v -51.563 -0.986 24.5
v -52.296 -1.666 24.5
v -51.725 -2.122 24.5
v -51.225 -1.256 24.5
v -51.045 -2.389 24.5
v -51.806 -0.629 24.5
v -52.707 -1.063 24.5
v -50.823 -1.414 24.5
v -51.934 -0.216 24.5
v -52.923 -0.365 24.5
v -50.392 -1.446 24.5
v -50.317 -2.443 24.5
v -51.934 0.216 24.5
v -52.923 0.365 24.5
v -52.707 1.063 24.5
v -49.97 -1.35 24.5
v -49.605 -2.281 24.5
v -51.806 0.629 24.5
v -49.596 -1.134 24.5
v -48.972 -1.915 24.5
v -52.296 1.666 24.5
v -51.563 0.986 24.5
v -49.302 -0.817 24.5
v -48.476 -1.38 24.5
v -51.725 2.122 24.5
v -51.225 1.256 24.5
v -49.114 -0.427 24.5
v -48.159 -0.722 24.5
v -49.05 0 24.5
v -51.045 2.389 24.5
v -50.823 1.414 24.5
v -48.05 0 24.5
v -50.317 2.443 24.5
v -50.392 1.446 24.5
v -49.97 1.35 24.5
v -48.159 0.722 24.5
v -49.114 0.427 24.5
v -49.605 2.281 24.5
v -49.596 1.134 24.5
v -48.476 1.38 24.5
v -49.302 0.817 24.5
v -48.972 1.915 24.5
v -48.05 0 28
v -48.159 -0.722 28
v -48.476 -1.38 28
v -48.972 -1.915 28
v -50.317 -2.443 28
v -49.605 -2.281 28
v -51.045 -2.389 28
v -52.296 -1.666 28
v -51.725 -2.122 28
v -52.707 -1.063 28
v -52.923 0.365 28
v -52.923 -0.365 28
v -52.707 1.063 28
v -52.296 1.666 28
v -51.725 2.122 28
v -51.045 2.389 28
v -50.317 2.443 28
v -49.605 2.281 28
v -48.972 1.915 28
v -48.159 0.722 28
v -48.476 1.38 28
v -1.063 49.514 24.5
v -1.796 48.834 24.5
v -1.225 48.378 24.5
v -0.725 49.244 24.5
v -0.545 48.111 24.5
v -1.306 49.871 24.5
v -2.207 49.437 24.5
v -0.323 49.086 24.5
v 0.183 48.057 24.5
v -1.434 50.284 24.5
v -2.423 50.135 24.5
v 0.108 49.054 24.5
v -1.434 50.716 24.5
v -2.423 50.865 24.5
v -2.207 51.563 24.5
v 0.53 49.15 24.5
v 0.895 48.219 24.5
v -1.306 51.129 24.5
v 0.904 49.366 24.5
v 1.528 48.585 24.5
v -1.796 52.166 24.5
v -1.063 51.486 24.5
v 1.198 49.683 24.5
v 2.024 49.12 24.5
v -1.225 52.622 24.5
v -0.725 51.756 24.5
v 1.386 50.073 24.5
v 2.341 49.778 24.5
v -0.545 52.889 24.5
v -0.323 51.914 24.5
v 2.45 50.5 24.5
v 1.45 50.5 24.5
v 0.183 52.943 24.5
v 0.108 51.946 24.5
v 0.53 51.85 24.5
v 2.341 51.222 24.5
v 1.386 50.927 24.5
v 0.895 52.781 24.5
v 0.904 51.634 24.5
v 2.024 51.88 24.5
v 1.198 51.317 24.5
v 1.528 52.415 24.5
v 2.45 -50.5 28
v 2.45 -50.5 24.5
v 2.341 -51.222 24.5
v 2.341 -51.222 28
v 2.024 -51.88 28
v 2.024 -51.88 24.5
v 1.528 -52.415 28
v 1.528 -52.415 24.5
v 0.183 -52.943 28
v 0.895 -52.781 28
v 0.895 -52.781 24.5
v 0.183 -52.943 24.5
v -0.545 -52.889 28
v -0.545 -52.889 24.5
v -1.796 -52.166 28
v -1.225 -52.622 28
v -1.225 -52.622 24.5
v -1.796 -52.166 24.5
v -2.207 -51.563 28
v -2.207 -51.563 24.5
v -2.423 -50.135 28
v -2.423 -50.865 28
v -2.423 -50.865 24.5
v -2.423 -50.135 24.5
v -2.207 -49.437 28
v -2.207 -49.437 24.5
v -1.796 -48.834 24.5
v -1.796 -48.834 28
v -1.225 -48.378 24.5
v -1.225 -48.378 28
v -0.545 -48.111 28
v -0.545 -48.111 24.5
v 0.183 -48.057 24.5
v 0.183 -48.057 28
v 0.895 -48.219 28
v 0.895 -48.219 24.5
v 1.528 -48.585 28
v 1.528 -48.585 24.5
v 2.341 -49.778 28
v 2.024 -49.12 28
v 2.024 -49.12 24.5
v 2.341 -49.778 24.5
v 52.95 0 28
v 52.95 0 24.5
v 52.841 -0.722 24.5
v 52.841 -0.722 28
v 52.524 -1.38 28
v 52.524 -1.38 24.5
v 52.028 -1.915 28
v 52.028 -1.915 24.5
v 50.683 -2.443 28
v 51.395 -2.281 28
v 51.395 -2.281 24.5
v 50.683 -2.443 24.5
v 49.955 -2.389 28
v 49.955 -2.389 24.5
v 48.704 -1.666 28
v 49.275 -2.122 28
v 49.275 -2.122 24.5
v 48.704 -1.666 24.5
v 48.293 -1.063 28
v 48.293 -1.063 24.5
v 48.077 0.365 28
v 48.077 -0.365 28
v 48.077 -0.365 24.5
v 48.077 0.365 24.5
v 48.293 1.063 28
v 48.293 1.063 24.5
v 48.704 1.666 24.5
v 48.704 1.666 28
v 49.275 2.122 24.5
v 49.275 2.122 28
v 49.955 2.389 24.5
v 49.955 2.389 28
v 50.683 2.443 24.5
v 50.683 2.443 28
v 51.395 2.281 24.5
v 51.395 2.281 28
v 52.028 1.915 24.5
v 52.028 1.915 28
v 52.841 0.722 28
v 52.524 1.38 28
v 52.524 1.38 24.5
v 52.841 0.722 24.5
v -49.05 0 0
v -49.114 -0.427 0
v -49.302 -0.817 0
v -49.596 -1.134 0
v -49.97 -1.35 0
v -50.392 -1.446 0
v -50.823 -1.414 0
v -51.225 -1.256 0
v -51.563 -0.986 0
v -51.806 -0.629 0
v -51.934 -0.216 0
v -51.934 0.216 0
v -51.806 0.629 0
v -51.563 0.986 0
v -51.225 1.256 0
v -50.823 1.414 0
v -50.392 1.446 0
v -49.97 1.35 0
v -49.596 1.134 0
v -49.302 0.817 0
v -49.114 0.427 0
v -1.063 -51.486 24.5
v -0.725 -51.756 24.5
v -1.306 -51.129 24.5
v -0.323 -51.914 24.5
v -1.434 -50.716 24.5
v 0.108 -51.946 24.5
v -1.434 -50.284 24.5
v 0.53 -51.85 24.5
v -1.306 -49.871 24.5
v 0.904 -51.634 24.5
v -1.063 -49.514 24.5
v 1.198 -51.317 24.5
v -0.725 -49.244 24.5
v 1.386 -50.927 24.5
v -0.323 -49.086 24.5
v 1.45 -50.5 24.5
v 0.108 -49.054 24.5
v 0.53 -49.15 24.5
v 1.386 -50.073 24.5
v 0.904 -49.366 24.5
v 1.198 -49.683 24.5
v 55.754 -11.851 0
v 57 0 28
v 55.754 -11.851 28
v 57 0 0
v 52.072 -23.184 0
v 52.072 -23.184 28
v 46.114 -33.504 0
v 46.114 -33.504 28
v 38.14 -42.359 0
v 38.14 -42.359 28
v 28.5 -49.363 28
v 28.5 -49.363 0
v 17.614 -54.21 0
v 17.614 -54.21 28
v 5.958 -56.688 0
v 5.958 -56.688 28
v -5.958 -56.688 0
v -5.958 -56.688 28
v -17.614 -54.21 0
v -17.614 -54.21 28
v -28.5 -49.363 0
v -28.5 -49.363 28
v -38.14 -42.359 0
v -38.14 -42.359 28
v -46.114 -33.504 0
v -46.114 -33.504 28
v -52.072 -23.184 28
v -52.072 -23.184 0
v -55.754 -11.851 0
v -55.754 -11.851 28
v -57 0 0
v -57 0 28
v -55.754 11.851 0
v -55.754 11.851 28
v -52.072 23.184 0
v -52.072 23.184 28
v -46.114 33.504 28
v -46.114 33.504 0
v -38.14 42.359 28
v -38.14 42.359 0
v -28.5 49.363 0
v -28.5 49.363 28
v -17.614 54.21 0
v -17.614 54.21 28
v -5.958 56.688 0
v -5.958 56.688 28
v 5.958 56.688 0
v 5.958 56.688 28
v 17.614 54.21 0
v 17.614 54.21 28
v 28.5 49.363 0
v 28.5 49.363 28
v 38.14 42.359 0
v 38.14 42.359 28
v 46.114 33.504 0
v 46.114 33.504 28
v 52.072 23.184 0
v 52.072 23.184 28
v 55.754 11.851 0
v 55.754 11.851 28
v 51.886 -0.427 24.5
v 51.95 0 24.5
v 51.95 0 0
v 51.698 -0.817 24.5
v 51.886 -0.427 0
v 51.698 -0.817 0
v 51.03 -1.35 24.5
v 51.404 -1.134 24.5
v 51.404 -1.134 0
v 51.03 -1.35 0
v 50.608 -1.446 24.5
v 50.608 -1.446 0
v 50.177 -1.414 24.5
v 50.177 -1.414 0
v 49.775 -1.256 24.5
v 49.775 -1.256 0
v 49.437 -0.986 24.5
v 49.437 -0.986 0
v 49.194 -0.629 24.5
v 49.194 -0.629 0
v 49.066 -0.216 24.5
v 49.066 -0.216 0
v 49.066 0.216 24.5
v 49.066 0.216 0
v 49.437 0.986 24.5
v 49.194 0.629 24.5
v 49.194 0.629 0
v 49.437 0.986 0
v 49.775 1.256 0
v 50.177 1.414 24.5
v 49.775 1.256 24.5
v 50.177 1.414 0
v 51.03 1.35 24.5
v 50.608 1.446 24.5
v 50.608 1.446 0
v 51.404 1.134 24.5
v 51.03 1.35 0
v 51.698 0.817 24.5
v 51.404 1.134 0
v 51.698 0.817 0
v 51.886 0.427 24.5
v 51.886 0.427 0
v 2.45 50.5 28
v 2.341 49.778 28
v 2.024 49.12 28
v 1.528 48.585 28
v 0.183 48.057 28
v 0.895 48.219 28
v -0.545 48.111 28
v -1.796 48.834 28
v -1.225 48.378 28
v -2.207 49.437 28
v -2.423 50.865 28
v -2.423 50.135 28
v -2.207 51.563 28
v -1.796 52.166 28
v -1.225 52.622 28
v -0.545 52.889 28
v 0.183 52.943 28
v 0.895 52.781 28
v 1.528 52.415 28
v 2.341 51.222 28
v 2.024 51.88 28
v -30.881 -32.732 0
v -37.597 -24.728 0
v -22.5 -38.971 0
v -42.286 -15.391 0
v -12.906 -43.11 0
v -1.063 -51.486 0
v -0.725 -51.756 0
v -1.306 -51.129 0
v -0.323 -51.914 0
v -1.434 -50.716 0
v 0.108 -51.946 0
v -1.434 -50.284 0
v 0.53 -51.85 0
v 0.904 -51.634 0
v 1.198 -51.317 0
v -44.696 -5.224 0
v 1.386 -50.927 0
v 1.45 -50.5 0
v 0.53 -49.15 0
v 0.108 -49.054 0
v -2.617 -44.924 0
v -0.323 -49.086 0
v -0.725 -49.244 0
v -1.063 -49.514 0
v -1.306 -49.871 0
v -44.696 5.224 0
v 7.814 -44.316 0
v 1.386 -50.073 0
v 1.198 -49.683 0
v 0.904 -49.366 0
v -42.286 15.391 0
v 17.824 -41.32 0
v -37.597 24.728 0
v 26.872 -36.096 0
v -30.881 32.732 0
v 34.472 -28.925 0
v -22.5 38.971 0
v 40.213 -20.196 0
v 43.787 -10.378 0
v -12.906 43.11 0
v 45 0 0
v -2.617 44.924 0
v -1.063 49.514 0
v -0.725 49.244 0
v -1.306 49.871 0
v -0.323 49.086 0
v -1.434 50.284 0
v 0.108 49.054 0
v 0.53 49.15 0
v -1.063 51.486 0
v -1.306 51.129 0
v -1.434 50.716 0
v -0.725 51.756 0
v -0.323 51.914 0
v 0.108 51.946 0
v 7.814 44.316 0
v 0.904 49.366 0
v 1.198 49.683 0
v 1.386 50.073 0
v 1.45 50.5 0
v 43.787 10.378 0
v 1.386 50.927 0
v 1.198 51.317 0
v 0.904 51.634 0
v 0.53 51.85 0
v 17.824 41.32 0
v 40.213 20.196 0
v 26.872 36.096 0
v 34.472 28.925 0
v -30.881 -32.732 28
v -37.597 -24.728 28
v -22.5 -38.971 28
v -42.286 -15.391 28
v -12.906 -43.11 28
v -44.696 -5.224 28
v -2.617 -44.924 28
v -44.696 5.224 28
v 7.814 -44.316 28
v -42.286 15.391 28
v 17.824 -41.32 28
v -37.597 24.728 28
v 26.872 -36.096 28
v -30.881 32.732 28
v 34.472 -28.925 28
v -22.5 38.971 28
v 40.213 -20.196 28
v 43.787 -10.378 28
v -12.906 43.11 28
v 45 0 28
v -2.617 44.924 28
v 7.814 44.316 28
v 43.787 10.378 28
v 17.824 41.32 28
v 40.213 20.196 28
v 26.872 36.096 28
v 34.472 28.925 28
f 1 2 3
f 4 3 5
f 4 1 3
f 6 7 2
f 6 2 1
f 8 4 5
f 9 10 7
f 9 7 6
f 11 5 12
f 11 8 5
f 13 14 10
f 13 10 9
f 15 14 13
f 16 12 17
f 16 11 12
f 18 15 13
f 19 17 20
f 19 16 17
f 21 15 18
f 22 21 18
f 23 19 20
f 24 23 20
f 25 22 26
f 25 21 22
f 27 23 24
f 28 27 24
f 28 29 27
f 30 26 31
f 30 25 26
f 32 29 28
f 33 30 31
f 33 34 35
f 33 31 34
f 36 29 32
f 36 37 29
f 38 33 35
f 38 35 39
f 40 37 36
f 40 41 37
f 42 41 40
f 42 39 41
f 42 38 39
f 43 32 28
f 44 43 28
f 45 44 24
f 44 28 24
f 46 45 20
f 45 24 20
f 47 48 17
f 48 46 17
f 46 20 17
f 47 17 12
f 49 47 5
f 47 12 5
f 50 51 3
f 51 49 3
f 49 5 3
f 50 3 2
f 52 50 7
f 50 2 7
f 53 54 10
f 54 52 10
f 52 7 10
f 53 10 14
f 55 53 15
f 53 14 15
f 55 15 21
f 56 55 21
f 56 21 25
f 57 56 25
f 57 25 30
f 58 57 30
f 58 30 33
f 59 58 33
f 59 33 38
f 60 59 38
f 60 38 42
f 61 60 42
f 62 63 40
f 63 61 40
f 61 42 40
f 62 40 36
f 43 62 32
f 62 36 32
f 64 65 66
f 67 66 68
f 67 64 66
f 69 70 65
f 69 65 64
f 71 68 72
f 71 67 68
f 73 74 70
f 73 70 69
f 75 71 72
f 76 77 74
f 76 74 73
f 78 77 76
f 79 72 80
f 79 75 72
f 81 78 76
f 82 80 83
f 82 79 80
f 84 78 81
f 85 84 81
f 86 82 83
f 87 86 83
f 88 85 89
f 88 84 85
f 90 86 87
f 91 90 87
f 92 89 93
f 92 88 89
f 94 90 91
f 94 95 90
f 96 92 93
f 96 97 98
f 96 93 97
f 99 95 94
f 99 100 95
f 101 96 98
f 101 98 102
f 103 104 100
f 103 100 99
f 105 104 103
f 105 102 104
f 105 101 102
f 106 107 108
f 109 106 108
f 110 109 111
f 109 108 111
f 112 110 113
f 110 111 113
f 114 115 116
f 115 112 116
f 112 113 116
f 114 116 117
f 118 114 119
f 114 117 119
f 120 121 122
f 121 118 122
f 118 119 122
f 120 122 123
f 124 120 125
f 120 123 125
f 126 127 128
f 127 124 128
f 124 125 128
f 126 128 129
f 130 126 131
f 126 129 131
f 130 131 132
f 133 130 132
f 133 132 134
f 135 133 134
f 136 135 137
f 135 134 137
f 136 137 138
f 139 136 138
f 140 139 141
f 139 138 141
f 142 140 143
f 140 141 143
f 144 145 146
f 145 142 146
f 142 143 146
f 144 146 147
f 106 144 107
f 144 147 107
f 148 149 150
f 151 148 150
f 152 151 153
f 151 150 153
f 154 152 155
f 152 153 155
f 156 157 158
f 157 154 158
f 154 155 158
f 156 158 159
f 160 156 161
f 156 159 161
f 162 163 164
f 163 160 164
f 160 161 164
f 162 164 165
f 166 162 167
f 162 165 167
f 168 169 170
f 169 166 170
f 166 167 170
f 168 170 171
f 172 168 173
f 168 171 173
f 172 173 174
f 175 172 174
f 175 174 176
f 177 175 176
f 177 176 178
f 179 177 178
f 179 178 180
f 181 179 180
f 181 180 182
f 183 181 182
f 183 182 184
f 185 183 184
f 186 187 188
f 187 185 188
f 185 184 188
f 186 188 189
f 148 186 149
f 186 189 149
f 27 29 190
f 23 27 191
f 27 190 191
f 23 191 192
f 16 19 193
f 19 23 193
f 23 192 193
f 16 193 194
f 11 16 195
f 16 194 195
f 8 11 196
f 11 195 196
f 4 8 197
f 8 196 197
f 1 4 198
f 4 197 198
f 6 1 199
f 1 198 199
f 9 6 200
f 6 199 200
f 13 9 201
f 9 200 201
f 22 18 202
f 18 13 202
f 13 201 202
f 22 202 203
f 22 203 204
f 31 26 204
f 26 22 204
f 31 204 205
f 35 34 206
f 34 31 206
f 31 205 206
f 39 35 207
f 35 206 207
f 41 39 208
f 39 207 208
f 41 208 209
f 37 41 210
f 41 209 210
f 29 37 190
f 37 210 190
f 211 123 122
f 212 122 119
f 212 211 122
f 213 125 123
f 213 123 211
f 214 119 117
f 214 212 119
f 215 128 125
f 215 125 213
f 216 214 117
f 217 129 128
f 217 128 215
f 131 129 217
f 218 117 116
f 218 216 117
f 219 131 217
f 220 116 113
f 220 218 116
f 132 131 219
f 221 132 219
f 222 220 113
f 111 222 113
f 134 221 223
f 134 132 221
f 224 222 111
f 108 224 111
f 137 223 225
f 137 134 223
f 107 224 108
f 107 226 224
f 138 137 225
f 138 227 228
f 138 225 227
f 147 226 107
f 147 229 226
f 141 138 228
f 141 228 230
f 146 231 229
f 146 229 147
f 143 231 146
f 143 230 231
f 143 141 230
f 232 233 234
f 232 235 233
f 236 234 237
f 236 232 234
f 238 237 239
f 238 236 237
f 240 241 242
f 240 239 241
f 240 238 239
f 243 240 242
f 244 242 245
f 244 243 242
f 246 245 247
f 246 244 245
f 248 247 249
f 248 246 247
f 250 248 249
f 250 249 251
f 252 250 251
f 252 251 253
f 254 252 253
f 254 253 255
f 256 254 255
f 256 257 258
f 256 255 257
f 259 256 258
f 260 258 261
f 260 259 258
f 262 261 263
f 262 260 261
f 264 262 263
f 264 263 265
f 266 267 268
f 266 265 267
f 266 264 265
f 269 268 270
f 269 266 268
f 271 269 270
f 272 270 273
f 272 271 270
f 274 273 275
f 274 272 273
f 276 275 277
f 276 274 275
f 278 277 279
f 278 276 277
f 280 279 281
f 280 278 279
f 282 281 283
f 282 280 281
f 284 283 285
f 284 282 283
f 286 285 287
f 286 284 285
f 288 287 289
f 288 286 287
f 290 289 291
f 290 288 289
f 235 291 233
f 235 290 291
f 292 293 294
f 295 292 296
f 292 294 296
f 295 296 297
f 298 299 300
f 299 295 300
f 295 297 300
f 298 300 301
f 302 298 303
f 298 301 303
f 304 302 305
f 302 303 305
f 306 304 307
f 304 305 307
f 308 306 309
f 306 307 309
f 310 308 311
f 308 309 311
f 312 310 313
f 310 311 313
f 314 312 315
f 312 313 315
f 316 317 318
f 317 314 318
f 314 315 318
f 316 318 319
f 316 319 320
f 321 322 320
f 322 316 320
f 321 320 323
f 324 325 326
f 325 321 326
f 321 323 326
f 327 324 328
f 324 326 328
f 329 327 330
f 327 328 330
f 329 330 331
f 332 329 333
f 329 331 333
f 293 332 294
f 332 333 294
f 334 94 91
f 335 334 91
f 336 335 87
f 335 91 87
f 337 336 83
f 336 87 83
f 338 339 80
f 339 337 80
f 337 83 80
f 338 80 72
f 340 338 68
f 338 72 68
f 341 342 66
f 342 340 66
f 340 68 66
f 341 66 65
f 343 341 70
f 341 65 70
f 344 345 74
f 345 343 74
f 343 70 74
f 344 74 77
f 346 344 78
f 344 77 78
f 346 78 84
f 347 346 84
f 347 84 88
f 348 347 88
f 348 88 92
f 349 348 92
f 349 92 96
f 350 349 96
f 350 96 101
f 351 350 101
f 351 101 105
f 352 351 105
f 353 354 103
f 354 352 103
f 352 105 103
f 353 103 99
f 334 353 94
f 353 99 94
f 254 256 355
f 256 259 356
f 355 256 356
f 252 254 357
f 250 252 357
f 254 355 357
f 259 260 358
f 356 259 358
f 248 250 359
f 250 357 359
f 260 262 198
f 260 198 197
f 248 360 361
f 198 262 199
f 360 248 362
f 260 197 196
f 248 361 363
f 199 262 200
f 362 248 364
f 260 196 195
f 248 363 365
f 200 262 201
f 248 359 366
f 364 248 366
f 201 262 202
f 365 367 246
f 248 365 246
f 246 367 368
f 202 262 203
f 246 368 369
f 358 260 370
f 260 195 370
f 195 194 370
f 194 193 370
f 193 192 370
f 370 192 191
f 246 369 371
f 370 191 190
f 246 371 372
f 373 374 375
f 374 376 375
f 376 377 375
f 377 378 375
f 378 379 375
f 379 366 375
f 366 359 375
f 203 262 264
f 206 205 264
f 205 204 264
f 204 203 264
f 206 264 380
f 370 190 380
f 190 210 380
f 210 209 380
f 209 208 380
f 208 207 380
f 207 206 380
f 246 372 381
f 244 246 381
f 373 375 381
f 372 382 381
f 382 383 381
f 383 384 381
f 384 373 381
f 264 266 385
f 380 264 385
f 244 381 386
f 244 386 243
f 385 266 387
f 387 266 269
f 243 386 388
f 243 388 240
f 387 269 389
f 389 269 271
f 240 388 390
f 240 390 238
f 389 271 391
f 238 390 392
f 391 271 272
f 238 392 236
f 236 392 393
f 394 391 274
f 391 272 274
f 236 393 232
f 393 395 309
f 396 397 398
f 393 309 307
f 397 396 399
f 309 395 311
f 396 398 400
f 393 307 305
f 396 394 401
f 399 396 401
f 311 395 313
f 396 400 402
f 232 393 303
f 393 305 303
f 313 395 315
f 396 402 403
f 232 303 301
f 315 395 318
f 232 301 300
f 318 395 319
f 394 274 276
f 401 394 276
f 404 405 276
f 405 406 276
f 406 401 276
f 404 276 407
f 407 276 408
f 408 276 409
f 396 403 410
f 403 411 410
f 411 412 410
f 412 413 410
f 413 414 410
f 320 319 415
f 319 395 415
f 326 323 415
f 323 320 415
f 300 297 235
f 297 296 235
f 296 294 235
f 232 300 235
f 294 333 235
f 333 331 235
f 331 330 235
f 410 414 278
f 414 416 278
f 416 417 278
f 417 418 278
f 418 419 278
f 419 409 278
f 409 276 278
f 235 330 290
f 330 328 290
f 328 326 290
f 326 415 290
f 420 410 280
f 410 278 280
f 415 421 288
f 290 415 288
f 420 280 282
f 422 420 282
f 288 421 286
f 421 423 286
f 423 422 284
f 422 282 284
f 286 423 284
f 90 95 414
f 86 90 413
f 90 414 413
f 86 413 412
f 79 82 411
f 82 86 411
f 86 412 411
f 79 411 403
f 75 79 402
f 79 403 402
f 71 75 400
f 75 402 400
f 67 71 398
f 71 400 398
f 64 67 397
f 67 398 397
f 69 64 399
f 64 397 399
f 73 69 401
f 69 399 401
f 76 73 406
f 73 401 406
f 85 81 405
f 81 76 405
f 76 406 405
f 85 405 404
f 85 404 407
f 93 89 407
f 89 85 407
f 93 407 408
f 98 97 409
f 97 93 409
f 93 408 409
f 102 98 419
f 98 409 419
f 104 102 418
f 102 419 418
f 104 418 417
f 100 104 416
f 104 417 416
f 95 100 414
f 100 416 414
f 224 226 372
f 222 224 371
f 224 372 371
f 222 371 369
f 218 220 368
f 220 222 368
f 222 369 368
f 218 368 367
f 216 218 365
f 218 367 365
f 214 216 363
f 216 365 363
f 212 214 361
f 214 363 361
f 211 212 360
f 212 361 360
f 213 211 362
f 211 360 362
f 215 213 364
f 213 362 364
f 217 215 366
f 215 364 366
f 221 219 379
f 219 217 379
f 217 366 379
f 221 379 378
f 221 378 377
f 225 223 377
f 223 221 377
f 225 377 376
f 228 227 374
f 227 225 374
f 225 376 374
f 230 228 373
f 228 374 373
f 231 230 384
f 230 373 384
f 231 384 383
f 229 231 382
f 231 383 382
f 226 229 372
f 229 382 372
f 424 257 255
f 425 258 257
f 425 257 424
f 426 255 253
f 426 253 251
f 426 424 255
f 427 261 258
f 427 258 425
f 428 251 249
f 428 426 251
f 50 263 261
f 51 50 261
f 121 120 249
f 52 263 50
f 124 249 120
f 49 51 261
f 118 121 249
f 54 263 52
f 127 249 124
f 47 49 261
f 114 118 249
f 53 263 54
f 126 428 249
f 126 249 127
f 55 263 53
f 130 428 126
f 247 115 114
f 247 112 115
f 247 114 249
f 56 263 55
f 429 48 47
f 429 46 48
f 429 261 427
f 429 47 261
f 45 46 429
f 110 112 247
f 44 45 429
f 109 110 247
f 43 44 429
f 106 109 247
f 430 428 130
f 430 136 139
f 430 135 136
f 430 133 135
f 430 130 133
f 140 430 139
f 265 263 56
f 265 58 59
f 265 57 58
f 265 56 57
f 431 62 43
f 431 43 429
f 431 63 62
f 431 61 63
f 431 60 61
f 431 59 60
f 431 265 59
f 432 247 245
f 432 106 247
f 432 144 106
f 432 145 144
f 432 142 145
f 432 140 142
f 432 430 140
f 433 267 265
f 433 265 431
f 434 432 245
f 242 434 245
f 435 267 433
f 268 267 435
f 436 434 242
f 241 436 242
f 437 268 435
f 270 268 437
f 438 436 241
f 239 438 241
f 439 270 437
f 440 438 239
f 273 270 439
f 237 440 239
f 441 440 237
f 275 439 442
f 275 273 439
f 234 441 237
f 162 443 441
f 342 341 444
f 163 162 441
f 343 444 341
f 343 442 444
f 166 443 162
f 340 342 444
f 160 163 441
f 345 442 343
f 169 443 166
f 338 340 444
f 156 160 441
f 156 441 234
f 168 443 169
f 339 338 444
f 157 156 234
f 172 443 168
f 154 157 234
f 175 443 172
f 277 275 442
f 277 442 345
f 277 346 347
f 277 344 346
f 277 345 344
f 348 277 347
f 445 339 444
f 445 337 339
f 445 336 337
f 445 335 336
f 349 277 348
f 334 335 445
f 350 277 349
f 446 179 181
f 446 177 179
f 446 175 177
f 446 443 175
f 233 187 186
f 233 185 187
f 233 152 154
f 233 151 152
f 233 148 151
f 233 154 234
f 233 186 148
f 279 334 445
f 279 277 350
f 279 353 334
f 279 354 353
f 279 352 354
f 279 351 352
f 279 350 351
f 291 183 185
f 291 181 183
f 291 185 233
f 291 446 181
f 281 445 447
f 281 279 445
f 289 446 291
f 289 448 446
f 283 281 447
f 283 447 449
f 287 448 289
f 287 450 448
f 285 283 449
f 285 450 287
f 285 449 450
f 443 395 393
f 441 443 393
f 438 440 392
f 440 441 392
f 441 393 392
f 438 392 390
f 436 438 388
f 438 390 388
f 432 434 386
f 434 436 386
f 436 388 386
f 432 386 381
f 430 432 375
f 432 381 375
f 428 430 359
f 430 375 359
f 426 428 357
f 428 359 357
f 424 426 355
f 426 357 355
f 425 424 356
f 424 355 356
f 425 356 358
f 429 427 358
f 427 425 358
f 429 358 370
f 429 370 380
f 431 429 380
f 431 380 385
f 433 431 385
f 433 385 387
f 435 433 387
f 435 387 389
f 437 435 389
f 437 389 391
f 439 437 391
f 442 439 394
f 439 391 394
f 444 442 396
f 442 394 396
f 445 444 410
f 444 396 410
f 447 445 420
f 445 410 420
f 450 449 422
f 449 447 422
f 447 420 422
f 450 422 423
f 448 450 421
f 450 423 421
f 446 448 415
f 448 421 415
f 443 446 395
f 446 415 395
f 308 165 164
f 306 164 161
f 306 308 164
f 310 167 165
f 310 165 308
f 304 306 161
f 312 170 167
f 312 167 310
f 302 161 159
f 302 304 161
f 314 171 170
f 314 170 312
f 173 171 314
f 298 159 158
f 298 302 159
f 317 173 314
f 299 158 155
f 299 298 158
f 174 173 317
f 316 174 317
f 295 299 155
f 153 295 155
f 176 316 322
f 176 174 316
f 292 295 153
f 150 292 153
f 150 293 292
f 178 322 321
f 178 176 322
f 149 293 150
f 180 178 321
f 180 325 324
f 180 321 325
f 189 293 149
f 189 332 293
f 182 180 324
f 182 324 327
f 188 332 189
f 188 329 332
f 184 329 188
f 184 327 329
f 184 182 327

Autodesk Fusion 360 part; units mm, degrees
sketch "Skizze1" plane through (0, 0, 0) normal (0, 0, 1) x (1, 0, 0)
  circle A0 centre (0, 0) radius 45
  circle A1 centre (0, 0) radius 57
  line L0 (-93.8803, 0) -> (101.1197, 0) construction
  line L1 (0, 80) -> (0, -75) construction
  circle A2 centre (50.5, 0) radius 1.45
  circle A3 centre (0, 50.5) radius 1.45
  line L2 (-57, 57) -> (57, 57) construction
  line L3 (57, 57) -> (57, -57) construction
  line L4 (57, -57) -> (-57, -57) construction
  line L5 (-57, -57) -> (-57, 57) construction
  circle A4 centre (50.5, 0) radius 2.45
  circle A5 centre (0, 50.5) radius 2.45
  circle A6 centre (-50.5, 0) radius 2.45
  circle A7 centre (-50.5, 0) radius 1.45
  circle A8 centre (0, -50.5) radius 2.45
  circle A9 centre (0, -50.5) radius 1.45
  dimension "d1" = 90
  dimension "d2" = 114
  dimension "d3" = 2.9
  dimension "d4" = 2.9
  dimension "d5" = 6.5
  dimension "d6" = 6.5
  dimension "d7" = 4.9
  dimension "d8" = 4.9
extrude "Extrusion1" add sketch "Skizze1" along normal blind 28 contours A1
extrude "Extrusion2" add sketch "Skizze1" along normal blind 24.5 contours A4 | A5 | A6 | A8
equation "d4 = d3"
equation "d6 = d5"
equation "d8 = d7"
